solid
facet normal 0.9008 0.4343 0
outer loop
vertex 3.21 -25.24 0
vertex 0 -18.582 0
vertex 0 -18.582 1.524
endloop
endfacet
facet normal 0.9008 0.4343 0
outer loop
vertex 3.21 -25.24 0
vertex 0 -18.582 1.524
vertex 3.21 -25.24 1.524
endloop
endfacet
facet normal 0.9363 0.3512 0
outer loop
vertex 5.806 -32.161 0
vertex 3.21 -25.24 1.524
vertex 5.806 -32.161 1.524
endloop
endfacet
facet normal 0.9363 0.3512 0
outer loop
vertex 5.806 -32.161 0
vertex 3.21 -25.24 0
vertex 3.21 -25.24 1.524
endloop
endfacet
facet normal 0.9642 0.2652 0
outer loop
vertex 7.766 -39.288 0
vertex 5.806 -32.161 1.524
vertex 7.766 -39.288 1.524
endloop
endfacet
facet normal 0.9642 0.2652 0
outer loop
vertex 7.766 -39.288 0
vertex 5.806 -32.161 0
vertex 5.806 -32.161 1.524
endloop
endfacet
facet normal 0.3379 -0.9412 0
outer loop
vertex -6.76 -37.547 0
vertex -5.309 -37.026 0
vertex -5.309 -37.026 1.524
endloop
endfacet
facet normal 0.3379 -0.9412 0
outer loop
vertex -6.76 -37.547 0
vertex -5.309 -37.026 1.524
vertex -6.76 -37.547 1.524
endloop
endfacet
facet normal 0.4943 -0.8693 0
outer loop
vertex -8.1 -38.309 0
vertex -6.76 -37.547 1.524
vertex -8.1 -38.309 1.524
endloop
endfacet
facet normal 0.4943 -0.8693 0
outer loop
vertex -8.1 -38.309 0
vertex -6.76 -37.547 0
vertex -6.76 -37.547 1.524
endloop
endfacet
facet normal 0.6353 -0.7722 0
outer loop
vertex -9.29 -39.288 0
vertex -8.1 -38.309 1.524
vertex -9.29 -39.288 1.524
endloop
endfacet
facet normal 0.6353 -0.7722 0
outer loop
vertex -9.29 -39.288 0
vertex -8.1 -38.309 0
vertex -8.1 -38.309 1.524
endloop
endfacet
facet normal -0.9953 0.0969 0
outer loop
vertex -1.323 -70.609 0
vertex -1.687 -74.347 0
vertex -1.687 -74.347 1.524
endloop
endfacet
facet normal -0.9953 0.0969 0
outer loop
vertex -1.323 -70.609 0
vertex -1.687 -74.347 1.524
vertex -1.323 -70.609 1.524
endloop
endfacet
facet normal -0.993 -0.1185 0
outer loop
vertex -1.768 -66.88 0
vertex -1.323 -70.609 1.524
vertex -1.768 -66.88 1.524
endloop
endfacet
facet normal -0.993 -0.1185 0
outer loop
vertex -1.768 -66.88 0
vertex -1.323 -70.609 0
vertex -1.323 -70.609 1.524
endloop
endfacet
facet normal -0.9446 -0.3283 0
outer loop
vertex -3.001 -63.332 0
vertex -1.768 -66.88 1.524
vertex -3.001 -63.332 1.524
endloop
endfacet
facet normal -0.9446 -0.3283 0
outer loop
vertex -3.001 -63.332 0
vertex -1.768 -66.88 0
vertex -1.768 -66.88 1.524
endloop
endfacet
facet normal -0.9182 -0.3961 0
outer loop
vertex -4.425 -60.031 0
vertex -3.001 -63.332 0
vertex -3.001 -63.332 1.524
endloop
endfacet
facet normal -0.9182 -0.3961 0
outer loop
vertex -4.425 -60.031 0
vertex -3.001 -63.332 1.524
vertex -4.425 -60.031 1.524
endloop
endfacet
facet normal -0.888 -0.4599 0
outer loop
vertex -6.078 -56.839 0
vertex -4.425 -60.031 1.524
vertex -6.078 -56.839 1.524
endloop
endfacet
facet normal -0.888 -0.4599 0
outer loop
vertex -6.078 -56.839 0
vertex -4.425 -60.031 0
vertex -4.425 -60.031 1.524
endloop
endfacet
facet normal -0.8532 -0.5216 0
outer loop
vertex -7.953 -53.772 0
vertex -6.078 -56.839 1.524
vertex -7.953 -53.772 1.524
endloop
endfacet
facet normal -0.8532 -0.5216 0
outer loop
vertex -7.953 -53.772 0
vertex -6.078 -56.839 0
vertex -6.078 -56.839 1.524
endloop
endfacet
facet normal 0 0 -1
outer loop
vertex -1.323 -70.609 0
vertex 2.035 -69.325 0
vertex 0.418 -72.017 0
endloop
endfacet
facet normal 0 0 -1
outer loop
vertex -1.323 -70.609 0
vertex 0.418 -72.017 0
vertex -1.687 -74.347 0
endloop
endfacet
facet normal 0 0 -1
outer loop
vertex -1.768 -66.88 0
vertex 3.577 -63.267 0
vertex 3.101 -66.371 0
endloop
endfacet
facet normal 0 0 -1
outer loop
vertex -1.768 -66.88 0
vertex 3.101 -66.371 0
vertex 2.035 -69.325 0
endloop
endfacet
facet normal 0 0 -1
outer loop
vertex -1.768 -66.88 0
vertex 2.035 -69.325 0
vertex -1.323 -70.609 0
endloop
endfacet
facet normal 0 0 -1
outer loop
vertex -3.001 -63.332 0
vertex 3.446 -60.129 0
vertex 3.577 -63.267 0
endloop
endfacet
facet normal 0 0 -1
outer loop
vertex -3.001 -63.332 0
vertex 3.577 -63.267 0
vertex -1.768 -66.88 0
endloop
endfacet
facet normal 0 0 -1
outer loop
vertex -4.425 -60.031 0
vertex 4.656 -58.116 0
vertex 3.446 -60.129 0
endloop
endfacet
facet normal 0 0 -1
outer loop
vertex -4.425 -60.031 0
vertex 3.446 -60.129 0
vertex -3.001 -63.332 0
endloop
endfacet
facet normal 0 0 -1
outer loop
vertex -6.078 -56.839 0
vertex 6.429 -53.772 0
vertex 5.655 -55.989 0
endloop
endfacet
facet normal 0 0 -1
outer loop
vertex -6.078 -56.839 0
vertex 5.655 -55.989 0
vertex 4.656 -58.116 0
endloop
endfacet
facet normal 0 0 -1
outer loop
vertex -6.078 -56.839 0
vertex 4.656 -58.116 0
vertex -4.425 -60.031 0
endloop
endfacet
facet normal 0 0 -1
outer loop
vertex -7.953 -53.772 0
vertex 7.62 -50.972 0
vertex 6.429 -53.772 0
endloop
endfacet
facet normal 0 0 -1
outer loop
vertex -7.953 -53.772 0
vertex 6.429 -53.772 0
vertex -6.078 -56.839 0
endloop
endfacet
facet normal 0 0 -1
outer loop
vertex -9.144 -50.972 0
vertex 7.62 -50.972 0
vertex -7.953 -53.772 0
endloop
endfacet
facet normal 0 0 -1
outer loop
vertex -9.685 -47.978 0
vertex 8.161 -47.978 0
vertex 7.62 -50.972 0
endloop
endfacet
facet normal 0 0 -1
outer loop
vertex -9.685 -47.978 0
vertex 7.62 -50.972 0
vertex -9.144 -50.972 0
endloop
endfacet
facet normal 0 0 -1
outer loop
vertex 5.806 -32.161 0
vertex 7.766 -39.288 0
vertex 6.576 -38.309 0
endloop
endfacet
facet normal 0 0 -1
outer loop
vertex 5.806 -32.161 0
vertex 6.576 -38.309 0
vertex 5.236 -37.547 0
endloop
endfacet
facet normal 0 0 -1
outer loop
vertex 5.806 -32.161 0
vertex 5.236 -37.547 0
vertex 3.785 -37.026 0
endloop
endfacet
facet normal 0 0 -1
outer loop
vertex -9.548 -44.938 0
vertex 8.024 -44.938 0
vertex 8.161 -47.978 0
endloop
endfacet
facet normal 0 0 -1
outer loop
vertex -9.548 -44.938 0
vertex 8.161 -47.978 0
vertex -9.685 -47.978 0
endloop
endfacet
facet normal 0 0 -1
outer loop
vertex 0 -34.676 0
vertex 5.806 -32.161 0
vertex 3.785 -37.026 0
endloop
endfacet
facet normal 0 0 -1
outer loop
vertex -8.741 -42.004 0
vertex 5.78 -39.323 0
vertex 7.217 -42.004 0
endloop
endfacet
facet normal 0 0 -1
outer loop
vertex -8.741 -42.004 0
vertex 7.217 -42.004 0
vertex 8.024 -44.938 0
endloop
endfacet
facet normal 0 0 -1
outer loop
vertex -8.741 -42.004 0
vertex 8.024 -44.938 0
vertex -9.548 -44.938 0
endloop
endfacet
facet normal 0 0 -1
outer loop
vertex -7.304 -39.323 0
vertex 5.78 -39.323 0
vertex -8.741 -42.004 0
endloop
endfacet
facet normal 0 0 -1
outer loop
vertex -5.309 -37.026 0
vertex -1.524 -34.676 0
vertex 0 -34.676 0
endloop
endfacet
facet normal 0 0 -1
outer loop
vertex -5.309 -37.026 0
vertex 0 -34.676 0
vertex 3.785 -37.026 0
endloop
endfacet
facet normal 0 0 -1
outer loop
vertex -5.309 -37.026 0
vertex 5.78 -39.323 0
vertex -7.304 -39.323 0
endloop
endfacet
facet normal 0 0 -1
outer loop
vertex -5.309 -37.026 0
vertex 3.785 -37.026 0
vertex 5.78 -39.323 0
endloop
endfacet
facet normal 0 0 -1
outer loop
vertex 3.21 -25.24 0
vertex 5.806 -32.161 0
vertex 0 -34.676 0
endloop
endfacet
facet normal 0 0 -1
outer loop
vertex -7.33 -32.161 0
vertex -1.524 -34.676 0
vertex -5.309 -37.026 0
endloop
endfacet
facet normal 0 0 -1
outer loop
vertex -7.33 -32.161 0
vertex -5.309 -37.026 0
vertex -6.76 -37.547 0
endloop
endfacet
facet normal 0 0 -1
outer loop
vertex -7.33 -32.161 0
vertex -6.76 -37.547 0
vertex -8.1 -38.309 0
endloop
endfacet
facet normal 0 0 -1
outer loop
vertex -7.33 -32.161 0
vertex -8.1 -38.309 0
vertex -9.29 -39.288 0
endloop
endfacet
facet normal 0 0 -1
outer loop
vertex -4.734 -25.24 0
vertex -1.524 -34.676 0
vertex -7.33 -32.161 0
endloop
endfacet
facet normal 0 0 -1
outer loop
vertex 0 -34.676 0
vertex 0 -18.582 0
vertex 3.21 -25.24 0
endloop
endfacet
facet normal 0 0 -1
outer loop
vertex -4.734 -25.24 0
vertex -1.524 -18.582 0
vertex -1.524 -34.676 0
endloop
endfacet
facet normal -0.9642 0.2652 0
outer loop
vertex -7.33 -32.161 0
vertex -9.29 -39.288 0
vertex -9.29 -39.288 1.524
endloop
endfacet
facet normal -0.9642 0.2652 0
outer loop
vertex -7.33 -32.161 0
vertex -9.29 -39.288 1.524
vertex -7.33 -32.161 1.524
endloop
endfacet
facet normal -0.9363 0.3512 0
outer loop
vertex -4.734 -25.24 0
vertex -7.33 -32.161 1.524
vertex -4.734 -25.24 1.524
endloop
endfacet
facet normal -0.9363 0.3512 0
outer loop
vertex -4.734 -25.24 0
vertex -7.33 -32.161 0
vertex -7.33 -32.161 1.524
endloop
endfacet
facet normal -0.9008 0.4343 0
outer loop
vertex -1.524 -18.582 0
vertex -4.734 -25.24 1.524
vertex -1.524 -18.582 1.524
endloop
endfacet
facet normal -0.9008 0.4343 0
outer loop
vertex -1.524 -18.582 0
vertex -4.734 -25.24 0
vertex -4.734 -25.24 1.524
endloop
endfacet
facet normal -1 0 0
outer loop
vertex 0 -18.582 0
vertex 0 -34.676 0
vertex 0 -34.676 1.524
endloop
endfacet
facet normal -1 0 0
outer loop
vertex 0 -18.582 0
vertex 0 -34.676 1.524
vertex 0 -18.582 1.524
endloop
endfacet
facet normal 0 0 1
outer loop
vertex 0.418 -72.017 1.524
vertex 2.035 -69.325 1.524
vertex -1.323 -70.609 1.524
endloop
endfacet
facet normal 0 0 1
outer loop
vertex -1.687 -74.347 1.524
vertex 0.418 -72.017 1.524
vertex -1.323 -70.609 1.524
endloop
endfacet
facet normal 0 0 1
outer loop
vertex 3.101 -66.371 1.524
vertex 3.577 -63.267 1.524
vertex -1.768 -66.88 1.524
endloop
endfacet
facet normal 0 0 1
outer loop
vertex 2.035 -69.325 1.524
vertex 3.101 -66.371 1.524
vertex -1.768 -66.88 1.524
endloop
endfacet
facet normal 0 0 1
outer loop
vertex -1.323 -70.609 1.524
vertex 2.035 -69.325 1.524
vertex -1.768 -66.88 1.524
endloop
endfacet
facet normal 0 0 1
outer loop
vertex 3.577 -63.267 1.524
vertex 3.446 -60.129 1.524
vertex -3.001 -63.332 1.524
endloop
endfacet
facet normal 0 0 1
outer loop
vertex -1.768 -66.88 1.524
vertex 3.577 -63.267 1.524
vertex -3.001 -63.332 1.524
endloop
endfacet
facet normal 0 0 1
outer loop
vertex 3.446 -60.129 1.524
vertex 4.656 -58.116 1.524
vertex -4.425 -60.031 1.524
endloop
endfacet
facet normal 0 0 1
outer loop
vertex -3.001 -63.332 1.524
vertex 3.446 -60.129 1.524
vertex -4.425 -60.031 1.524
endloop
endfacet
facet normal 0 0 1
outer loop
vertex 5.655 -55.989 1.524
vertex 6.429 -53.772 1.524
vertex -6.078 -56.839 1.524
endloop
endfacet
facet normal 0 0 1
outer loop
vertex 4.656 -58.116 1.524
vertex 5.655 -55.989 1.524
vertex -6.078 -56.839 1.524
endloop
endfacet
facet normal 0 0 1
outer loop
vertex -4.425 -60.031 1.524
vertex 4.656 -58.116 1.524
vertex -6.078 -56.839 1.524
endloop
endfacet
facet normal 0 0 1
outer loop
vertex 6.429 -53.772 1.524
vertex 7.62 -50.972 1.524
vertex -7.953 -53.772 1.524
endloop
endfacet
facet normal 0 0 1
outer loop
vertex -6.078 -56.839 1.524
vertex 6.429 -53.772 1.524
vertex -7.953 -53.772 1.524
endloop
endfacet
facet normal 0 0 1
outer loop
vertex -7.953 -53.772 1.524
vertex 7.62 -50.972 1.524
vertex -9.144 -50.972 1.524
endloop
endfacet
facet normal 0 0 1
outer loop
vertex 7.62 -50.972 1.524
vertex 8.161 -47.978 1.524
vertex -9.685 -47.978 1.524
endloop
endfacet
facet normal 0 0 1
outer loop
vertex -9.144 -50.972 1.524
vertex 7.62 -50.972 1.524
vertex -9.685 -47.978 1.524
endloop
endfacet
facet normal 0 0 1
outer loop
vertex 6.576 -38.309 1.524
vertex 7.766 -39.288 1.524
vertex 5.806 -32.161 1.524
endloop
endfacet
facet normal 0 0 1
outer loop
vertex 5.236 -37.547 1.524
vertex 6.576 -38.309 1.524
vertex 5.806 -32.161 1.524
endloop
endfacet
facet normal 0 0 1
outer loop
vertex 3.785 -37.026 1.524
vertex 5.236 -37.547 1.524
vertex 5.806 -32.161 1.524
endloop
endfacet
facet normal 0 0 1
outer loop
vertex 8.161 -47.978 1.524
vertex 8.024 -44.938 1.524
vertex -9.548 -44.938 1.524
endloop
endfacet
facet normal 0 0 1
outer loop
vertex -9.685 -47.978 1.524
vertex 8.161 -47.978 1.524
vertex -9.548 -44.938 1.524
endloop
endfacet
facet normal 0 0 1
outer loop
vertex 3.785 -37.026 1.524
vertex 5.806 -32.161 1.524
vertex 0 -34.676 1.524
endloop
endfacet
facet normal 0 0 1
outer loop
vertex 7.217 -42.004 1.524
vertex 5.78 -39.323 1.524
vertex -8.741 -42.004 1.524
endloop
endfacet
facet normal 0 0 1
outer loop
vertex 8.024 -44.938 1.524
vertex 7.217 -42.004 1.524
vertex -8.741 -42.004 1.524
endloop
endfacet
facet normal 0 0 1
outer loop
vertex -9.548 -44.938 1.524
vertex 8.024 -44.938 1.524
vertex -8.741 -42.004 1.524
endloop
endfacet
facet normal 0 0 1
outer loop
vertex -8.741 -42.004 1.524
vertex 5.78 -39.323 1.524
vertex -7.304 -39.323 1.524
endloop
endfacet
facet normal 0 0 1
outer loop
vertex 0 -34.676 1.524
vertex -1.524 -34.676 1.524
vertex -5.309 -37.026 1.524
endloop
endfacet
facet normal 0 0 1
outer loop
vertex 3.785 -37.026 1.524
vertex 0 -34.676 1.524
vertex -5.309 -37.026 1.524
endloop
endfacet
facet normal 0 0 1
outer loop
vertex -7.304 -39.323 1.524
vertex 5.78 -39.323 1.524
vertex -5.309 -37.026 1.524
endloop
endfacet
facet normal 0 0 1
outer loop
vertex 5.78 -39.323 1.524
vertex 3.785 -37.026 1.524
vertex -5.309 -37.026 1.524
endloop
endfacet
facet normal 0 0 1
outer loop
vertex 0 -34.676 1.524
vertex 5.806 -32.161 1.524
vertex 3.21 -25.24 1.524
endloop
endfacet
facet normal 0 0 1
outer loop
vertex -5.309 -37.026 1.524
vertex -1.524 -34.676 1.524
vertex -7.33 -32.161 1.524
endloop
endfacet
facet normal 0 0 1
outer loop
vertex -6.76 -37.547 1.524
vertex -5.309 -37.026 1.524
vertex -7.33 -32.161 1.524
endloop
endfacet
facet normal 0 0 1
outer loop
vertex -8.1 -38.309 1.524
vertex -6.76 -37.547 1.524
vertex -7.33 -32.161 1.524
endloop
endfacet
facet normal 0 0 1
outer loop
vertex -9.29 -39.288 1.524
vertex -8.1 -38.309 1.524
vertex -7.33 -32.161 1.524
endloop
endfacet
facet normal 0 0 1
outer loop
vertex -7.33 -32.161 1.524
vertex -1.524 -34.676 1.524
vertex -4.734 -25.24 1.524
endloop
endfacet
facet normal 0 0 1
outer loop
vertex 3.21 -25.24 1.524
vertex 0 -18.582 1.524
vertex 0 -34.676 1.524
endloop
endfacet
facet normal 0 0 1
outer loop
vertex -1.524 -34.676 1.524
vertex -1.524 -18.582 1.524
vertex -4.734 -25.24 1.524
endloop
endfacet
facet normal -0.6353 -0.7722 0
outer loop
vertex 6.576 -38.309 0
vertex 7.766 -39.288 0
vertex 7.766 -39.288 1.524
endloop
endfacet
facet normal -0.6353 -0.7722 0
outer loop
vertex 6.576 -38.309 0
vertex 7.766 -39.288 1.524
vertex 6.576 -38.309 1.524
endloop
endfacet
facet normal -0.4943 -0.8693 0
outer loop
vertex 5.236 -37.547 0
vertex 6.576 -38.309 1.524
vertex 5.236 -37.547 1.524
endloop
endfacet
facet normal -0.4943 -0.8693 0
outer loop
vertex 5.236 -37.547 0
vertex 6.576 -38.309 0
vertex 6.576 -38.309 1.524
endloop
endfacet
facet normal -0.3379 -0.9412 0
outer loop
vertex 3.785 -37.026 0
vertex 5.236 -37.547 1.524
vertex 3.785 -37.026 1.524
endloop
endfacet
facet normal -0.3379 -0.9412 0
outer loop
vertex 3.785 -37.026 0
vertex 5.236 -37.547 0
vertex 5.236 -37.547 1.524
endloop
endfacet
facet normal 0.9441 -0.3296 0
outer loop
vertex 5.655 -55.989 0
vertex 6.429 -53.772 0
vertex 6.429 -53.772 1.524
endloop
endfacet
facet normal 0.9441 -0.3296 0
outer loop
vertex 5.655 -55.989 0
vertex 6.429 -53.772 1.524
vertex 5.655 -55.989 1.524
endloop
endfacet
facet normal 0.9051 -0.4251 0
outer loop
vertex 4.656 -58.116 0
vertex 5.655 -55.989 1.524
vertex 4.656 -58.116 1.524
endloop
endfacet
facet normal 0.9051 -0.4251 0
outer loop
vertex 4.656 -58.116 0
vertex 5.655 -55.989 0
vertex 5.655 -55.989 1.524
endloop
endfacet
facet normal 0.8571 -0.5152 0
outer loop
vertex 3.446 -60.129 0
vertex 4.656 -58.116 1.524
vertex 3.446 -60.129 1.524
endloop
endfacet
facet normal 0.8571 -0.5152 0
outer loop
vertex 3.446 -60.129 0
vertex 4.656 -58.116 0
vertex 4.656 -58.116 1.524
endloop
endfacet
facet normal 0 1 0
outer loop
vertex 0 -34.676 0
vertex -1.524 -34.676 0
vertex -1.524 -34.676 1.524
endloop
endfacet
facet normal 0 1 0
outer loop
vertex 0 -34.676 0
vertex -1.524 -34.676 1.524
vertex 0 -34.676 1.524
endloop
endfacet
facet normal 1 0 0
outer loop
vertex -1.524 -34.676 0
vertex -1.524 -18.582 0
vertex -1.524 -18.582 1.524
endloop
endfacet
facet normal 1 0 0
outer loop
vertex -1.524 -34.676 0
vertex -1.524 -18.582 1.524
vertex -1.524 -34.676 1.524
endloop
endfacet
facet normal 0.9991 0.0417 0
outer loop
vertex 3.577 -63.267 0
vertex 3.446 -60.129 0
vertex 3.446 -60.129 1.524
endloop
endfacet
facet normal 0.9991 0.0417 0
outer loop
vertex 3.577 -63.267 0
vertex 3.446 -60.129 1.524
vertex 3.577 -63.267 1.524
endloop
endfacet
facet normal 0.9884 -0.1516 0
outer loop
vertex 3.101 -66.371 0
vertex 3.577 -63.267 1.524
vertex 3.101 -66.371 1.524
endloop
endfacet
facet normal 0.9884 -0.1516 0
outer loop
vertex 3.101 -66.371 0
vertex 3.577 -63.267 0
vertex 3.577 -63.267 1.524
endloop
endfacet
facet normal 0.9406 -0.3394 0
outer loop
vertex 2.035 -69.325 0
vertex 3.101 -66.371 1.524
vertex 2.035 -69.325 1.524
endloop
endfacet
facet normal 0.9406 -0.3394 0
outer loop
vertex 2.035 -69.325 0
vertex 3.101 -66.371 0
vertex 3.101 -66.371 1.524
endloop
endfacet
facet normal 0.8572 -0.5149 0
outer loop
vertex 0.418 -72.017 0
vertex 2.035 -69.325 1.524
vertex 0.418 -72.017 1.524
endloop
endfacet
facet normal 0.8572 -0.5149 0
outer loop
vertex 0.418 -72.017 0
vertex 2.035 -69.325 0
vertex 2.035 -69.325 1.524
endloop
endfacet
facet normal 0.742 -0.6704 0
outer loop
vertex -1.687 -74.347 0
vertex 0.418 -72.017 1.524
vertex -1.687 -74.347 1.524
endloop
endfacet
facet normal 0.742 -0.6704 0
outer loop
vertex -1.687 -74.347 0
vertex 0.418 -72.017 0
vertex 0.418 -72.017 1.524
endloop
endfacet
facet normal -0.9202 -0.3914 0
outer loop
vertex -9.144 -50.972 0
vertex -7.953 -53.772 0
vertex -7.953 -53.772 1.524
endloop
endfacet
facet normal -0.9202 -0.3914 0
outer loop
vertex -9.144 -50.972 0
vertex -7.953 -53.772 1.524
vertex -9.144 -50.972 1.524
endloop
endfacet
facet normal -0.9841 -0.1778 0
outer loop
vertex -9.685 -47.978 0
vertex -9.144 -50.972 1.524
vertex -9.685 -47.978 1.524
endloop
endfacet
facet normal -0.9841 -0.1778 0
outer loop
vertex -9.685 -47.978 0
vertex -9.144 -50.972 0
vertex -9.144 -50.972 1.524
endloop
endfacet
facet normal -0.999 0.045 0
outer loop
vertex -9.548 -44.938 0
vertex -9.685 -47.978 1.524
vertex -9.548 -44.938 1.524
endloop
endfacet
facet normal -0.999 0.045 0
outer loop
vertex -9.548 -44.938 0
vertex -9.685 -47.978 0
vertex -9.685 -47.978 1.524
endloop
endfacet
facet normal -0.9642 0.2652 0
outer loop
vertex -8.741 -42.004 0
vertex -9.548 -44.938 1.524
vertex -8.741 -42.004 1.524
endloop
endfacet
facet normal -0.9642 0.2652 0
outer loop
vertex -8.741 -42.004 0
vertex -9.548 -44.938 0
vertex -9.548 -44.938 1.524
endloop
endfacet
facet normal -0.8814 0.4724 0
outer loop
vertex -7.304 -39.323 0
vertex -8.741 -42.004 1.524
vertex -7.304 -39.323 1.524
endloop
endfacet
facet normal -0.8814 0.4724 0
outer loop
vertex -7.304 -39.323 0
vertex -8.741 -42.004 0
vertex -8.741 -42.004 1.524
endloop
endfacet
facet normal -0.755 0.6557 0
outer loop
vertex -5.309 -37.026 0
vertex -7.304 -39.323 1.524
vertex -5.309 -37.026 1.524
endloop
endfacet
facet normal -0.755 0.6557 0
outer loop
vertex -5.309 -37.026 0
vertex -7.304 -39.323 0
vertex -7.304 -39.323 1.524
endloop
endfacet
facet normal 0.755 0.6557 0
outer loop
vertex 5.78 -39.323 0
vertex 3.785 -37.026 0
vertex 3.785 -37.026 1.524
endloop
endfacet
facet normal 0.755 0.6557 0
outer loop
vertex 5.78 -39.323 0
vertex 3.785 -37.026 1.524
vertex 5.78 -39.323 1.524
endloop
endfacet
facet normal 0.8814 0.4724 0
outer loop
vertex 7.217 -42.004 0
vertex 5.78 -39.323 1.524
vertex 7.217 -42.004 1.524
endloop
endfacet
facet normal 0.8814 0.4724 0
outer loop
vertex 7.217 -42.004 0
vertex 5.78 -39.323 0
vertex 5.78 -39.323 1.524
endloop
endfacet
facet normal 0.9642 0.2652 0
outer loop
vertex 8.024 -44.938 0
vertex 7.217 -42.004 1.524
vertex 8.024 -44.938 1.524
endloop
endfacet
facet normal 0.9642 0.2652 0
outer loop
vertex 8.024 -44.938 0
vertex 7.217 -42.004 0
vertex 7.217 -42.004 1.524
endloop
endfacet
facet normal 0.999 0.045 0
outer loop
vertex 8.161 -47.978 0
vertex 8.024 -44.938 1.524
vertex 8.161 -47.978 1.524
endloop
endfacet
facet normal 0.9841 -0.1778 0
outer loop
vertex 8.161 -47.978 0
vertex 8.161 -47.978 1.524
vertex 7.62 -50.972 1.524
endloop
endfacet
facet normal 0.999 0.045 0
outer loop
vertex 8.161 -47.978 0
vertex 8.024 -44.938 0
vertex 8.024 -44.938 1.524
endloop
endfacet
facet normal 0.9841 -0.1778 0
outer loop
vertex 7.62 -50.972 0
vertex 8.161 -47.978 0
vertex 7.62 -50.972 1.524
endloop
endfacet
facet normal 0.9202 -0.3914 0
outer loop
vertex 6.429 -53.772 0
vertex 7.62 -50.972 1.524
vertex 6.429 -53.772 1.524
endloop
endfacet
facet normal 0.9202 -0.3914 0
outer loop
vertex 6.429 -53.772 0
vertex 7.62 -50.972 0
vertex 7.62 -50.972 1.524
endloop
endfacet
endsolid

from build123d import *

# Parameters (mm, degrees)
BOSS_EXTRUDE1_DEPTH = 1.524


with BuildPart() as part:
    # Sketch1 → Boss-Extrude1 (new body)
    with BuildSketch(Plane.XY):
        with BuildLine():
            Line((-1.524, -34.676201819), (0, -34.676201819))
            Line((0, -34.676201819), (0, -18.581601914))
            ThreePointArc((0, -18.581601914), (4.586568454, -28.671218755), (7.766480304, -39.288428313))
            ThreePointArc((7.766480304, -39.288428313), (5.922115133, -37.899455621), (3.784796816, -37.026072296))
            ThreePointArc((3.784796816, -37.026072296), (8.024285986, -44.938100791), (6.429295491, -53.771529834))
            ThreePointArc((6.429295491, -53.771529834), (5.182840175, -57.065431108), (3.445514823, -60.128948218))
            ThreePointArc((3.445514823, -60.128948218), (2.639499088, -67.873650649), (-1.687439347, -74.347264855))
            ThreePointArc((-1.687439347, -74.347264855), (-1.444255212, -68.732462045), (-3.001469179, -63.332440397))
            ThreePointArc((-3.001469179, -63.332440397), (-5.223476479, -58.420481145), (-7.953295491, -53.771529834))
            ThreePointArc((-7.953295491, -53.771529834), (-9.548285986, -44.938100791), (-5.308796816, -37.026072296))
            ThreePointArc((-5.308796816, -37.026072296), (-7.446115133, -37.899455621), (-9.290480304, -39.288428313))
            ThreePointArc((-9.290480304, -39.288428313), (-6.110568454, -28.671218755), (-1.524, -18.581601914))
            Line((-1.524, -18.581601914), (-1.524, -34.676201819))
        make_face()
    extrude(amount=BOSS_EXTRUDE1_DEPTH)


solid = part.part
